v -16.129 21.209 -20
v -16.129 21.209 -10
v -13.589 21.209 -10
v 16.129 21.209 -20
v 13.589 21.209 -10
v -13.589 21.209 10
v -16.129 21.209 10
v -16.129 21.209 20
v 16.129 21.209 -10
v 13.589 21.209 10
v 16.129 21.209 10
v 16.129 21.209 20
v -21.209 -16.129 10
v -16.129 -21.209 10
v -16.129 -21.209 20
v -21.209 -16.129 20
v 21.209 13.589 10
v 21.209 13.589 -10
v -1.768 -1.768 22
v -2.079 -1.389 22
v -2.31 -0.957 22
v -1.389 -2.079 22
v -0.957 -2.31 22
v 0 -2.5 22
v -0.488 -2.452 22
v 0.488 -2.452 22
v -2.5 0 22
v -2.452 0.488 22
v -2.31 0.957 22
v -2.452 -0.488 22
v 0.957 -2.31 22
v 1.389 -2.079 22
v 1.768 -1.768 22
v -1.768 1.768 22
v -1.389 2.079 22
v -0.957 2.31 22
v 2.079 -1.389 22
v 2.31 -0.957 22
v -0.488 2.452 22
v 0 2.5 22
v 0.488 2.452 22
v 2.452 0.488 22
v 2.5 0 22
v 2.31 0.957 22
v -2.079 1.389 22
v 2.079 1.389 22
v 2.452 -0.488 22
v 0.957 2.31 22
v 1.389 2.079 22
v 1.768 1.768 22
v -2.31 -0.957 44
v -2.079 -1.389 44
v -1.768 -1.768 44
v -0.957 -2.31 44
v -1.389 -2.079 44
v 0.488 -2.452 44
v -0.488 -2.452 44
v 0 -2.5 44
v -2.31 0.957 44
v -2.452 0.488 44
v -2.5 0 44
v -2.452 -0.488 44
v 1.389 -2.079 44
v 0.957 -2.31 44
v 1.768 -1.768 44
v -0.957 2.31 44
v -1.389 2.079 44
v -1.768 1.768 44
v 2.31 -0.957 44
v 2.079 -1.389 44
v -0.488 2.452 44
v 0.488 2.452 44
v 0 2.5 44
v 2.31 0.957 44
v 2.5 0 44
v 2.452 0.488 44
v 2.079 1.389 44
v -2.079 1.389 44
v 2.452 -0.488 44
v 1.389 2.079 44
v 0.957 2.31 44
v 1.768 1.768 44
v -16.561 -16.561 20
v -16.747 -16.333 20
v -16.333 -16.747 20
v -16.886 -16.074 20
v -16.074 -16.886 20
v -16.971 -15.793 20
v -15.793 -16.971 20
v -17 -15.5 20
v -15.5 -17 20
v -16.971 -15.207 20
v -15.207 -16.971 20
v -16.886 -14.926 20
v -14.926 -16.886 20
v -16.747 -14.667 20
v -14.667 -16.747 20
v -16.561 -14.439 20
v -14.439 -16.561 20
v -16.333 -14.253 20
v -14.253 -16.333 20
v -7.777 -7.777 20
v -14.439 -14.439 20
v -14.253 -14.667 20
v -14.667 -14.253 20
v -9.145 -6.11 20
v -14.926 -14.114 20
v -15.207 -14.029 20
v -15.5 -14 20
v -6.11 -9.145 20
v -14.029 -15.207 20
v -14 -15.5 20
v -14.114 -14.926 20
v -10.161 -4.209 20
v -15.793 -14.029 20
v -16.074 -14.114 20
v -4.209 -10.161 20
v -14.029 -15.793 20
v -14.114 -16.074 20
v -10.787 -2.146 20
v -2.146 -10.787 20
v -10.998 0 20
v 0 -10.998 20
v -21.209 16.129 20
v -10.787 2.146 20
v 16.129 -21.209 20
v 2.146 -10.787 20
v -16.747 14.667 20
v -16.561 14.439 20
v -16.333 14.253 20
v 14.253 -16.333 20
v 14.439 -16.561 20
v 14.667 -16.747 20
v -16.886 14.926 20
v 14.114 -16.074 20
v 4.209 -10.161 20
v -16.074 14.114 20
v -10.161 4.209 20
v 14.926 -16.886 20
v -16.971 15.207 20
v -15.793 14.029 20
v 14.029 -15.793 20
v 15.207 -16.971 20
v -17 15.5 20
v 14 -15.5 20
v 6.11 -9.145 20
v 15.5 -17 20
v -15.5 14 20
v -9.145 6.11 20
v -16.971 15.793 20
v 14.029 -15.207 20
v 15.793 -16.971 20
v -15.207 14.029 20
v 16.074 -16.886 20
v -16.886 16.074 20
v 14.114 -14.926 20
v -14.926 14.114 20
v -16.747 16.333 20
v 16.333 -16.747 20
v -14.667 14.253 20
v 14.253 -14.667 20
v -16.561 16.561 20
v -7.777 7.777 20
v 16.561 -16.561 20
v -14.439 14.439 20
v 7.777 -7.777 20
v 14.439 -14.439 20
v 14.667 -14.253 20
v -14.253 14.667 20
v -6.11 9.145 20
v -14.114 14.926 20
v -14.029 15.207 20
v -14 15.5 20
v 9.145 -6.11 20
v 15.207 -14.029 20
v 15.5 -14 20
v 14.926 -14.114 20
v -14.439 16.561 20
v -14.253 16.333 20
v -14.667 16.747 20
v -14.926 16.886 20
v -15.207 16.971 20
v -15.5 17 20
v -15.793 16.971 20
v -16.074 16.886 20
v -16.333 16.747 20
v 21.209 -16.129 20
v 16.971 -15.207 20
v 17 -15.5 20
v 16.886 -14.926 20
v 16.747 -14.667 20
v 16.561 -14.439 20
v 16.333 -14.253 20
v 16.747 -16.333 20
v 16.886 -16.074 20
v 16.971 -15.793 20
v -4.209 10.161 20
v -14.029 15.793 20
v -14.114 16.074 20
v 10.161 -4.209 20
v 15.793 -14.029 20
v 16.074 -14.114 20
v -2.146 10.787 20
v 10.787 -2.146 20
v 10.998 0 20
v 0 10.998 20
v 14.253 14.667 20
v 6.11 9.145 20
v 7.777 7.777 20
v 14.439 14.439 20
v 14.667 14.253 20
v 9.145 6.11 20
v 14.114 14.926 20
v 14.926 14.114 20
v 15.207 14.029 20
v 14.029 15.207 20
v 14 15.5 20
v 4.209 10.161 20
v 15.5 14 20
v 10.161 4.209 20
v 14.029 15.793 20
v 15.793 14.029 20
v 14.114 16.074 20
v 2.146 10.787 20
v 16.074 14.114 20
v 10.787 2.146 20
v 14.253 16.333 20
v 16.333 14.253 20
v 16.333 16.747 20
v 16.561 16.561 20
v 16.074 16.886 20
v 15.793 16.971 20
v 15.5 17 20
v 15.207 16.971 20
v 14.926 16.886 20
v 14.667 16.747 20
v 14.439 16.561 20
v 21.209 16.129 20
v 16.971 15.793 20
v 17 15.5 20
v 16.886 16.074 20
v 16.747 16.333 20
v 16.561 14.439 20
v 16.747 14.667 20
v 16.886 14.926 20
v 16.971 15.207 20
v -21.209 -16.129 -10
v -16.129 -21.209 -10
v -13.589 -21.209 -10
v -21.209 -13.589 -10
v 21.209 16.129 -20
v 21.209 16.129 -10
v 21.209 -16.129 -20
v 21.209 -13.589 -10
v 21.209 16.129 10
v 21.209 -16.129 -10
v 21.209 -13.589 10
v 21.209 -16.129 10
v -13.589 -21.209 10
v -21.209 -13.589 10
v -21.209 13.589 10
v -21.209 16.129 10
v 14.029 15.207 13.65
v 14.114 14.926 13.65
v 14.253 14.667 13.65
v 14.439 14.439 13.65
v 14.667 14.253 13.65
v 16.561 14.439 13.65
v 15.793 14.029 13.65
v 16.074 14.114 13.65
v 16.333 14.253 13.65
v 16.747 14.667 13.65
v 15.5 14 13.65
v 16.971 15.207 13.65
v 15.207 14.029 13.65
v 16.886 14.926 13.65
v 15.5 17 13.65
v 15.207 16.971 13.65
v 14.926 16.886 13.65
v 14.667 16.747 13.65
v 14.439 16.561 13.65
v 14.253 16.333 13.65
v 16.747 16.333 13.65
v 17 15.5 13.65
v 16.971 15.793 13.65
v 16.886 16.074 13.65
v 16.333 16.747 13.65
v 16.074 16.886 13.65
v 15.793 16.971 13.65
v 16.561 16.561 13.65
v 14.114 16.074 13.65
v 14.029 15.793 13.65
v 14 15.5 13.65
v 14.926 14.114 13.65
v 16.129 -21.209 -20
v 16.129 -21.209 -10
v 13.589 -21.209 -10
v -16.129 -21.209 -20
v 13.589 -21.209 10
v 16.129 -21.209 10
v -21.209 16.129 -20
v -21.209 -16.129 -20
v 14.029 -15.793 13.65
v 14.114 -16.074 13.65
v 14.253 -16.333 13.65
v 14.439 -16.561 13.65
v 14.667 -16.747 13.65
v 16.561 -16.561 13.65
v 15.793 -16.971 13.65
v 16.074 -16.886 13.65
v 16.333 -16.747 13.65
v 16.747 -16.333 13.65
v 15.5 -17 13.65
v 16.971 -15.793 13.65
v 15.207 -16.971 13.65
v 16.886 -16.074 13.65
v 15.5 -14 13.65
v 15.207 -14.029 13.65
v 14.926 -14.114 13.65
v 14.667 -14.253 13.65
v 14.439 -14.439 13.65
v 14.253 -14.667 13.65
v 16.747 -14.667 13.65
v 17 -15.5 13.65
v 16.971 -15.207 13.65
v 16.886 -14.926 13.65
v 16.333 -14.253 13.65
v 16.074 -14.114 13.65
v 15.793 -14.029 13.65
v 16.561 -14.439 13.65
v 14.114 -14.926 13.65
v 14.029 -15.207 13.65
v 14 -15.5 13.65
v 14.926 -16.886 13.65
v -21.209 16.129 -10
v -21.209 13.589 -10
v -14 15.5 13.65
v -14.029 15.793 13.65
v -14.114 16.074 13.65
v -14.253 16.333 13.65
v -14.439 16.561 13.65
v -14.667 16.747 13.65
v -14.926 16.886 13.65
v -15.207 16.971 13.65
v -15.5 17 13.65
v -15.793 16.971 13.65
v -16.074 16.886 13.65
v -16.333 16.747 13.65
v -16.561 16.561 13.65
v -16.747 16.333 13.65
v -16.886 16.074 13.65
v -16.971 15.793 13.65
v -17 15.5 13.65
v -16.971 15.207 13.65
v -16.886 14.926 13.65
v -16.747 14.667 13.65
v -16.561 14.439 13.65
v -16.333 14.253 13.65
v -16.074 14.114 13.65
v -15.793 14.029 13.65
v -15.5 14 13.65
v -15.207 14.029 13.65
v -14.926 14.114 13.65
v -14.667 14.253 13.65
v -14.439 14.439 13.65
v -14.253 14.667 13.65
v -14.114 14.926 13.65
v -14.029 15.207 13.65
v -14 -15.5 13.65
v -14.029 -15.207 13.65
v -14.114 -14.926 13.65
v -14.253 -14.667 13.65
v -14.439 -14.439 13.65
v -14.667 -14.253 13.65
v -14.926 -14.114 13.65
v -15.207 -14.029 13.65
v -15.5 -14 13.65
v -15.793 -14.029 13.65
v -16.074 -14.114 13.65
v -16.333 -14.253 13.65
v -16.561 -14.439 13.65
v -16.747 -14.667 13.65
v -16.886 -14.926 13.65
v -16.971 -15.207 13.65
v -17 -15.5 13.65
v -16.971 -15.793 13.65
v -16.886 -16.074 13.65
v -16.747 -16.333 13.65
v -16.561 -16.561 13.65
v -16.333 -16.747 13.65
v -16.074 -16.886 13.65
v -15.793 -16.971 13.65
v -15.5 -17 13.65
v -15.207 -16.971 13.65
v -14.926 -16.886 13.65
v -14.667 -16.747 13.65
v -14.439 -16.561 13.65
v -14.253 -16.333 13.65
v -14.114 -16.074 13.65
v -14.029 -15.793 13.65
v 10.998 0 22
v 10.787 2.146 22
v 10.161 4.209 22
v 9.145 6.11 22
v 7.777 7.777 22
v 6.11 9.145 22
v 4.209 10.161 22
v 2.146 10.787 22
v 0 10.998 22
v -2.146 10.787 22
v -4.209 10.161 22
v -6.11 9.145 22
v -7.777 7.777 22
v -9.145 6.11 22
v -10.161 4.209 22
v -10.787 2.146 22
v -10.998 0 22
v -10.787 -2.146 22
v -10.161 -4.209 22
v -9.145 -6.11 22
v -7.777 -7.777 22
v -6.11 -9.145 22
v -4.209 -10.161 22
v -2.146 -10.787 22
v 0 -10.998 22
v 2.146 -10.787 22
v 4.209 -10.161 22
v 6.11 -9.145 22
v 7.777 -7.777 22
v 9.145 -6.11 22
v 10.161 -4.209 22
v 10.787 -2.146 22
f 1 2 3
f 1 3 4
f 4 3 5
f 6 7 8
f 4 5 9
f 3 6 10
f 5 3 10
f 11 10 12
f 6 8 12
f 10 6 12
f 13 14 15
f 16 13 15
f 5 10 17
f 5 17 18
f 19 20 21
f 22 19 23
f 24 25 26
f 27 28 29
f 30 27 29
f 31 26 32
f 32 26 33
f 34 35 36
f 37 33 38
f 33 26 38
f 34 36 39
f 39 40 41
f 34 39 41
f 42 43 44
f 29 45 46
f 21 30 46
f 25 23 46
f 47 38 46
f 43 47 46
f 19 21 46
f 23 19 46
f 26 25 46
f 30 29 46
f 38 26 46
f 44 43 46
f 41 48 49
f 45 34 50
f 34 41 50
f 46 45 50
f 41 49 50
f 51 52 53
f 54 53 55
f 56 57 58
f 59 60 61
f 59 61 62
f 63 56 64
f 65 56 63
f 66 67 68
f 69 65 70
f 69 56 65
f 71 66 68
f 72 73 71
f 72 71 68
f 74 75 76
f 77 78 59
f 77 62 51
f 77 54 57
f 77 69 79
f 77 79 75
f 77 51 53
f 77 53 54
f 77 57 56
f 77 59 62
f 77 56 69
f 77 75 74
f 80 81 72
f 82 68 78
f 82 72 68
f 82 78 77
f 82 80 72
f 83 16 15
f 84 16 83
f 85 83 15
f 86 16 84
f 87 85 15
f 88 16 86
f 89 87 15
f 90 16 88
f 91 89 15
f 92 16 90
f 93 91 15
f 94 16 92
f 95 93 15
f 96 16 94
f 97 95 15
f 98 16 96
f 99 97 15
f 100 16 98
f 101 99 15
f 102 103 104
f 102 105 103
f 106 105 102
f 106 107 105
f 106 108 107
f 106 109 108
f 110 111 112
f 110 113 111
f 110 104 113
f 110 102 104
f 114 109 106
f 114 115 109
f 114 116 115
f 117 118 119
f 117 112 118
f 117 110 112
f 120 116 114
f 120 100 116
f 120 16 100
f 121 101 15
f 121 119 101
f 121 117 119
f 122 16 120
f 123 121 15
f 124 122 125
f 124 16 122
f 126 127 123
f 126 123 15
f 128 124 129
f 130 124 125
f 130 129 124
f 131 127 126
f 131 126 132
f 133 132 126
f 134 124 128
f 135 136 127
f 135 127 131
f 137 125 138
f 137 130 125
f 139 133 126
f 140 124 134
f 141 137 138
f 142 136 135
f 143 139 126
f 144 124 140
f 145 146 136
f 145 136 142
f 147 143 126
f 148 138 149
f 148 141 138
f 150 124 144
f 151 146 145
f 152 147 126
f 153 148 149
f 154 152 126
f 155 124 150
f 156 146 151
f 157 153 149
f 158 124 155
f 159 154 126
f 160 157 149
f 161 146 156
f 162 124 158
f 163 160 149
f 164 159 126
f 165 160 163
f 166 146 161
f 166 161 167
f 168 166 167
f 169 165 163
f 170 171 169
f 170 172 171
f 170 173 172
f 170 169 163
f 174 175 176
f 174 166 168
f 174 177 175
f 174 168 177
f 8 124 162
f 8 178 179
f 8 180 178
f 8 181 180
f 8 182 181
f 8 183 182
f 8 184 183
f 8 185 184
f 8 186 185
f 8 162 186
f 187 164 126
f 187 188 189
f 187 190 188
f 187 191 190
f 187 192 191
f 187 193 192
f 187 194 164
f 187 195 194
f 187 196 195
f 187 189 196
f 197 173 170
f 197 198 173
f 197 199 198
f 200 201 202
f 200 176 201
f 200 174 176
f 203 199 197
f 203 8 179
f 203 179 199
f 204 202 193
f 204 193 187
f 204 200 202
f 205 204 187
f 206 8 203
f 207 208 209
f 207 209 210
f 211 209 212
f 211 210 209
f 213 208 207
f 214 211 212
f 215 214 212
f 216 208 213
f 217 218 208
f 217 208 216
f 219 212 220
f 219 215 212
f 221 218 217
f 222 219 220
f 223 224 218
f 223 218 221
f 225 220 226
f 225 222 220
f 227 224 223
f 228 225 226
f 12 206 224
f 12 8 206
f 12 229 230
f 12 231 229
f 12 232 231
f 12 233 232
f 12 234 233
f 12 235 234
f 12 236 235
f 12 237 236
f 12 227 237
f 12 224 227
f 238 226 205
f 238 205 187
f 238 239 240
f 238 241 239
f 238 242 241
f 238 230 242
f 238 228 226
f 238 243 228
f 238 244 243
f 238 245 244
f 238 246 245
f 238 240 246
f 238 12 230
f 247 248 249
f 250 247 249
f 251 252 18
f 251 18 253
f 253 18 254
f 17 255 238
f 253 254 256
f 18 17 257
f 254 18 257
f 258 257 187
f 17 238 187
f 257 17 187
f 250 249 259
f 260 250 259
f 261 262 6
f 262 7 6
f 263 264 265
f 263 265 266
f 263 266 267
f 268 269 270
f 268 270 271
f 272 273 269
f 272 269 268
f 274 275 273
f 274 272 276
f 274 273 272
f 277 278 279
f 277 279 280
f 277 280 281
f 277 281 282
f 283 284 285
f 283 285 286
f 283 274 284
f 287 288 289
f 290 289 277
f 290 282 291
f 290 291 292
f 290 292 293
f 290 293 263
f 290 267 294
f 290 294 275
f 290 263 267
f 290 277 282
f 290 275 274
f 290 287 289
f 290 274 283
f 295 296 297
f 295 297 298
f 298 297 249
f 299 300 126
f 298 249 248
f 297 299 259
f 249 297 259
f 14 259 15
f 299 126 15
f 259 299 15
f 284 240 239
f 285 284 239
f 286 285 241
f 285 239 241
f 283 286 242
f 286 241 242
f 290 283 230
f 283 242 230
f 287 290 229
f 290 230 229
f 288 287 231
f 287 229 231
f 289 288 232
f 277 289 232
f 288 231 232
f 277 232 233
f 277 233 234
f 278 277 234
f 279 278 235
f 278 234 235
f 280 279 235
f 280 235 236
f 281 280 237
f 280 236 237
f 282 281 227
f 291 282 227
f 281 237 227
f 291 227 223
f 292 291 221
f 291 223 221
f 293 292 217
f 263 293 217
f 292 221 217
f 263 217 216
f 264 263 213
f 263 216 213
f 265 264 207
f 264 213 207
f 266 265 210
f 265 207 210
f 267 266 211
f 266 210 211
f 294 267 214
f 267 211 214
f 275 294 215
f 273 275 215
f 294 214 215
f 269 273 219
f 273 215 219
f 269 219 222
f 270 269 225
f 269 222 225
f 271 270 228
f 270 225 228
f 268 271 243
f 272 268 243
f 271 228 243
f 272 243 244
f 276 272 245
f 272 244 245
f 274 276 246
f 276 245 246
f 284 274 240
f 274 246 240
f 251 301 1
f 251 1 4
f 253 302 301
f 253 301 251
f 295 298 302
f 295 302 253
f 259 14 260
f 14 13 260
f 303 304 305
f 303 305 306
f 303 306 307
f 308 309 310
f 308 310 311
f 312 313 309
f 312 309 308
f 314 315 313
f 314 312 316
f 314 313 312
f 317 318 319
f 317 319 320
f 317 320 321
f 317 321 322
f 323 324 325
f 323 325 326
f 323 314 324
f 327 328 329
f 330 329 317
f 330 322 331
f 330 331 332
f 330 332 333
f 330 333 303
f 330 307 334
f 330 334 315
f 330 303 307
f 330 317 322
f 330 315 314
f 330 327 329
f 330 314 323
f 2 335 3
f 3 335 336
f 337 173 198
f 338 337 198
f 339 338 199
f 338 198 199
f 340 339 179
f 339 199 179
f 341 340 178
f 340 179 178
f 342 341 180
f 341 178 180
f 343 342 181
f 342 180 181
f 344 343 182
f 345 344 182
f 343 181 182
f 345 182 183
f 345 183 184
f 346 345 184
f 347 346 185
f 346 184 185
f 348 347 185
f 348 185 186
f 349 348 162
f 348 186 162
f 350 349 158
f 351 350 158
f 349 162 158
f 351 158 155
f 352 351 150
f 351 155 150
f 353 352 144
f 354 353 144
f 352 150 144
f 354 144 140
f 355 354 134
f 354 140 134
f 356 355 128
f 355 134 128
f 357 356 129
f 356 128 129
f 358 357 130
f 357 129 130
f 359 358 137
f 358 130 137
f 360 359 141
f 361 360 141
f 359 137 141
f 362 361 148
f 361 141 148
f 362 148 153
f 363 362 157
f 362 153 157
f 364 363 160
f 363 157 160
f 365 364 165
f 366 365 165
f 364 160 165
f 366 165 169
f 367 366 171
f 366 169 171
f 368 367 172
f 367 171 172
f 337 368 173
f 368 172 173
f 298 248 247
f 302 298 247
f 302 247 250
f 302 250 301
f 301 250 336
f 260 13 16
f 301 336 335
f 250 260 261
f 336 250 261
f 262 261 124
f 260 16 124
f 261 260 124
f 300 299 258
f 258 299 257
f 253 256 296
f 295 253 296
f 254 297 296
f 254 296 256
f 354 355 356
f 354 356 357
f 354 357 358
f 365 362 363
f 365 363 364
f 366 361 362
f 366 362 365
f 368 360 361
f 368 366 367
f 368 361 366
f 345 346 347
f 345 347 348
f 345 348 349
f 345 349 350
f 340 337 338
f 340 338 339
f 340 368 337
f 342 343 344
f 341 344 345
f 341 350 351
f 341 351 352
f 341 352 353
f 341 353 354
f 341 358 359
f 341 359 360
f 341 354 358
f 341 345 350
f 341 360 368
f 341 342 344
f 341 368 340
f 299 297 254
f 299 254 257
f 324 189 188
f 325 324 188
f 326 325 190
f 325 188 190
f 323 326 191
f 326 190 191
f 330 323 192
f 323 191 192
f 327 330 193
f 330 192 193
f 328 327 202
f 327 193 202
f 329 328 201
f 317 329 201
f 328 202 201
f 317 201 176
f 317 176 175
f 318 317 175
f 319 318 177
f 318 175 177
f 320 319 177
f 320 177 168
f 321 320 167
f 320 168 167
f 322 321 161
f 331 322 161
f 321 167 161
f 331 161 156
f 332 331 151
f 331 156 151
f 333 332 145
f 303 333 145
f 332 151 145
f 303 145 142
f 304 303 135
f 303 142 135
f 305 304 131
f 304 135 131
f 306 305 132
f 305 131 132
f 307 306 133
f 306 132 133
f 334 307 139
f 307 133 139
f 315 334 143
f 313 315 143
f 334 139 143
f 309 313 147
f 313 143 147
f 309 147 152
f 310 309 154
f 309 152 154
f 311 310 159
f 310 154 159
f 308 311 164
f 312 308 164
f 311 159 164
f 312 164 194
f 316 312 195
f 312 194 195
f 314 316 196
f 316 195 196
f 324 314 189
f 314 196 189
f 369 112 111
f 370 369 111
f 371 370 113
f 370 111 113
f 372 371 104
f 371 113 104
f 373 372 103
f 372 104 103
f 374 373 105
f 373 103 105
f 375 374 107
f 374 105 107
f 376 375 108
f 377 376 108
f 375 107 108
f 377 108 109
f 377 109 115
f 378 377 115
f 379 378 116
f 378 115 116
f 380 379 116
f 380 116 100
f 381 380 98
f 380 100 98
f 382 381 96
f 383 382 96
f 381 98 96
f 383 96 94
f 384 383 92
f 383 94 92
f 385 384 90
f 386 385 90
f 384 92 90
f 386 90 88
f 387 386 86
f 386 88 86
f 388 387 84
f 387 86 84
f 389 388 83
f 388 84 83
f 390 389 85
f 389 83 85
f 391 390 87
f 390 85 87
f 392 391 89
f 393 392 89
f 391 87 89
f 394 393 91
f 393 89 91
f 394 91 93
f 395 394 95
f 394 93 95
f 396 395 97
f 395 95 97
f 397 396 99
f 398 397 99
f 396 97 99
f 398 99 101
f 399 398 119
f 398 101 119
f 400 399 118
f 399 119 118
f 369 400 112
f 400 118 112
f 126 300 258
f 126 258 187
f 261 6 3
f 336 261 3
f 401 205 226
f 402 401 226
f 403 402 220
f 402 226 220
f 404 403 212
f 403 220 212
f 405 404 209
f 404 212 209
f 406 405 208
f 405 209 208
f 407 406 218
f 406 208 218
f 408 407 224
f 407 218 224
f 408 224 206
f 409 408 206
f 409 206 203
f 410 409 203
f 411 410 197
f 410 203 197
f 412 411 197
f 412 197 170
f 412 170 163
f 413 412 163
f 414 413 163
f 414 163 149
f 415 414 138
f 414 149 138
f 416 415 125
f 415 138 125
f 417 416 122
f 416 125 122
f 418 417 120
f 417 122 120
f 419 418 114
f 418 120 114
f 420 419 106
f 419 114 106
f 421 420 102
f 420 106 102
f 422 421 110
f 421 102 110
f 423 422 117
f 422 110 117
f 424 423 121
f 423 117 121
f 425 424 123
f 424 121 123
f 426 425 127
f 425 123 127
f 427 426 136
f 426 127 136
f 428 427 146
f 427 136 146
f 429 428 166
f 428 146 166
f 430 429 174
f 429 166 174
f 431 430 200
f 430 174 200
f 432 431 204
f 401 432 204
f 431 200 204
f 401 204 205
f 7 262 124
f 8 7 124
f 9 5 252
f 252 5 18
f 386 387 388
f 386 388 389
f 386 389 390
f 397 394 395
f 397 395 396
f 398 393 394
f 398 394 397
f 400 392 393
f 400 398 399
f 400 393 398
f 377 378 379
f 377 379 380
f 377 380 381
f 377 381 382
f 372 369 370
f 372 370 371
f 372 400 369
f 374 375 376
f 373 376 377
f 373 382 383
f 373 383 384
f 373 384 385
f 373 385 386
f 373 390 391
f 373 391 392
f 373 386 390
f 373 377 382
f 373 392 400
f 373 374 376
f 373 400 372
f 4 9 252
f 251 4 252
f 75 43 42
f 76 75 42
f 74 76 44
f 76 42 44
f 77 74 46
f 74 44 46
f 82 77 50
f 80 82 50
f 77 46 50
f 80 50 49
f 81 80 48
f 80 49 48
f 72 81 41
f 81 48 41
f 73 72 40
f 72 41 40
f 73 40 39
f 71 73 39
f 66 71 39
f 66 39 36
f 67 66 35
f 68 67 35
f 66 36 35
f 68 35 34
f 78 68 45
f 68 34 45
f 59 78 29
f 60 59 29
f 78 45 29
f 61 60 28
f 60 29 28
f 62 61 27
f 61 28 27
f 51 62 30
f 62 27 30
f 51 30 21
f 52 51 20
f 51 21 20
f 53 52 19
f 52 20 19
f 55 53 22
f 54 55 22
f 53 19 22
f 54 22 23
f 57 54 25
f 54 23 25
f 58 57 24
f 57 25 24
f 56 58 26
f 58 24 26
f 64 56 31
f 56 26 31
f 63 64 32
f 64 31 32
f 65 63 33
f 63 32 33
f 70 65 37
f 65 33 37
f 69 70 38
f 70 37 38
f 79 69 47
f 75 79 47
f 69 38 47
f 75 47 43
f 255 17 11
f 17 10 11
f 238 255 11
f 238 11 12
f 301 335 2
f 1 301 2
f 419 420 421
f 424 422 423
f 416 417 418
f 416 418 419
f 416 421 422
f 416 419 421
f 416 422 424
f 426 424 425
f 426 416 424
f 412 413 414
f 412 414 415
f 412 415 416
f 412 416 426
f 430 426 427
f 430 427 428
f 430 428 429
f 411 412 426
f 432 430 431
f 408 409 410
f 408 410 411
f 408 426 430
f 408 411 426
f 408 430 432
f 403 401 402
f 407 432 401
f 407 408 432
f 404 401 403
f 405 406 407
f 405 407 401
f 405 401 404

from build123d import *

# Parameters (mm, degrees)
F0_W      = 42.418
F0_H      = 42.418
F1_DEPTH  = 10
F2_SIZE   = 7.62
F4_DEPTH  = 10
F5_SIZE   = 5.08
F7_DEPTH  = 10
F8_R      = 10.9982
F9_DEPTH  = 2
F10_R     = 2.5
F11_DEPTH = 22
F13_DEPTH = 15
F14_R     = 1.5
F15_DEPTH = 6.35


with BuildPart() as f1:
    # F0 (on Top) → F1 (new body, symmetric)
    with BuildSketch(Plane.XY):
        Rectangle(F0_W, F0_H)
    extrude(amount=F1_DEPTH, both=True)

    # F2
    f2_edges = [f1.edges().sort_by_distance(p)[0] for p in [
        (21.209, 21.209, 0),
        (-21.209, 21.209, 0),
        (-21.209, -21.209, 0),
        (21.209, -21.209, 0),
    ]]
    chamfer(f2_edges, length=F2_SIZE)

    # F3 (on face) → F4 (join)
    with BuildSketch(Plane.XY.offset(10)):
        Polygon((13.589, 21.209), (-13.589, 21.209), (-21.209, 13.589), (-21.209, -13.589), (-13.589, -21.209), (13.589, -21.209), (21.209, -13.589), (21.209, 13.589), align=None)
        Polygon((21.209, 21.209), (13.589, 21.209), (21.209, 13.589), align=None)
        Polygon((-13.589, 21.209), (-21.209, 21.209), (-21.209, 13.589), align=None)
        Polygon((-13.589, -21.209), (-21.209, -13.589), (-21.209, -21.209), align=None)
        Polygon((21.209, -21.209), (21.209, -13.589), (13.589, -21.209), align=None)
    extrude(amount=F4_DEPTH)

    # F5
    f5_edges = [f1.edges().sort_by_distance(p)[0] for p in [
        (21.209, 21.209, 15),
        (-21.209, 21.209, 15),
        (-21.209, -21.209, 15),
        (21.209, -21.209, 15),
    ]]
    chamfer(f5_edges, length=F5_SIZE)

    # F6 (on face) → F7 (join)
    with BuildSketch(Plane(origin=(0, 0, -10), x_dir=(1, 0, 0), z_dir=(0, 0, -1))):
        Polygon((-13.589, 21.209), (-16.129, 21.209), (-21.209, 16.129), (-21.209, 13.589), align=None)
        Polygon((16.129, 21.209), (13.589, 21.209), (21.209, 13.589), (21.209, 16.129), align=None)
        Polygon((21.209, -16.129), (21.209, -13.589), (13.589, -21.209), (16.129, -21.209), align=None)
        Polygon((-13.589, -21.209), (-21.209, -13.589), (-21.209, -16.129), (-16.129, -21.209), align=None)
        Polygon((13.589, 21.209), (-13.589, 21.209), (-21.209, 13.589), (-21.209, -13.589), (-13.589, -21.209), (13.589, -21.209), (21.209, -13.589), (21.209, 13.589), align=None)
    extrude(amount=F7_DEPTH)

    # F8 (on face) → F9 (join)
    with BuildSketch(Plane.XY.offset(20)):
        Circle(F8_R)
    extrude(amount=F9_DEPTH)

    # F12 (on face) → F13 (cut)
    with BuildSketch(Plane.XY.offset(44)):
        with BuildLine():
            Line((2.6203631624, 2.9334036984), (-2.6333660554, 2.9334036984))
            Line((-2.6333660554, 2.9334036984), (-2.6333660554, 2))
            Line((-2.6333660554, 2), (-1.5, 2))
            ThreePointArc((-1.5, 2), (0, 2.5), (1.5, 2))
            Line((1.5, 2), (2.6203631624, 2))
            Line((2.6203631624, 2), (2.6203631624, 2.9334036984))
        make_face()
    extrude(amount=-F13_DEPTH, mode=Mode.SUBTRACT)

    # F14 (on face) → F15 (cut)
    with BuildSketch(Plane.XY.offset(20)):
        with Locations((-15.5, 15.5)):
            Circle(F14_R)
        with Locations((15.5, 15.5)):
            Circle(F14_R)
        with Locations((15.5, -15.5)):
            Circle(F14_R)
        with Locations((-15.5, -15.5)):
            Circle(F14_R)
    extrude(amount=-F15_DEPTH, mode=Mode.SUBTRACT)


with BuildPart() as f11:
    # F10 (on face) → F11 (new body)
    with BuildSketch(Plane.XY.offset(22)):
        Circle(F10_R)
    extrude(amount=F11_DEPTH)


solid = Compound([f1.part, f11.part])
